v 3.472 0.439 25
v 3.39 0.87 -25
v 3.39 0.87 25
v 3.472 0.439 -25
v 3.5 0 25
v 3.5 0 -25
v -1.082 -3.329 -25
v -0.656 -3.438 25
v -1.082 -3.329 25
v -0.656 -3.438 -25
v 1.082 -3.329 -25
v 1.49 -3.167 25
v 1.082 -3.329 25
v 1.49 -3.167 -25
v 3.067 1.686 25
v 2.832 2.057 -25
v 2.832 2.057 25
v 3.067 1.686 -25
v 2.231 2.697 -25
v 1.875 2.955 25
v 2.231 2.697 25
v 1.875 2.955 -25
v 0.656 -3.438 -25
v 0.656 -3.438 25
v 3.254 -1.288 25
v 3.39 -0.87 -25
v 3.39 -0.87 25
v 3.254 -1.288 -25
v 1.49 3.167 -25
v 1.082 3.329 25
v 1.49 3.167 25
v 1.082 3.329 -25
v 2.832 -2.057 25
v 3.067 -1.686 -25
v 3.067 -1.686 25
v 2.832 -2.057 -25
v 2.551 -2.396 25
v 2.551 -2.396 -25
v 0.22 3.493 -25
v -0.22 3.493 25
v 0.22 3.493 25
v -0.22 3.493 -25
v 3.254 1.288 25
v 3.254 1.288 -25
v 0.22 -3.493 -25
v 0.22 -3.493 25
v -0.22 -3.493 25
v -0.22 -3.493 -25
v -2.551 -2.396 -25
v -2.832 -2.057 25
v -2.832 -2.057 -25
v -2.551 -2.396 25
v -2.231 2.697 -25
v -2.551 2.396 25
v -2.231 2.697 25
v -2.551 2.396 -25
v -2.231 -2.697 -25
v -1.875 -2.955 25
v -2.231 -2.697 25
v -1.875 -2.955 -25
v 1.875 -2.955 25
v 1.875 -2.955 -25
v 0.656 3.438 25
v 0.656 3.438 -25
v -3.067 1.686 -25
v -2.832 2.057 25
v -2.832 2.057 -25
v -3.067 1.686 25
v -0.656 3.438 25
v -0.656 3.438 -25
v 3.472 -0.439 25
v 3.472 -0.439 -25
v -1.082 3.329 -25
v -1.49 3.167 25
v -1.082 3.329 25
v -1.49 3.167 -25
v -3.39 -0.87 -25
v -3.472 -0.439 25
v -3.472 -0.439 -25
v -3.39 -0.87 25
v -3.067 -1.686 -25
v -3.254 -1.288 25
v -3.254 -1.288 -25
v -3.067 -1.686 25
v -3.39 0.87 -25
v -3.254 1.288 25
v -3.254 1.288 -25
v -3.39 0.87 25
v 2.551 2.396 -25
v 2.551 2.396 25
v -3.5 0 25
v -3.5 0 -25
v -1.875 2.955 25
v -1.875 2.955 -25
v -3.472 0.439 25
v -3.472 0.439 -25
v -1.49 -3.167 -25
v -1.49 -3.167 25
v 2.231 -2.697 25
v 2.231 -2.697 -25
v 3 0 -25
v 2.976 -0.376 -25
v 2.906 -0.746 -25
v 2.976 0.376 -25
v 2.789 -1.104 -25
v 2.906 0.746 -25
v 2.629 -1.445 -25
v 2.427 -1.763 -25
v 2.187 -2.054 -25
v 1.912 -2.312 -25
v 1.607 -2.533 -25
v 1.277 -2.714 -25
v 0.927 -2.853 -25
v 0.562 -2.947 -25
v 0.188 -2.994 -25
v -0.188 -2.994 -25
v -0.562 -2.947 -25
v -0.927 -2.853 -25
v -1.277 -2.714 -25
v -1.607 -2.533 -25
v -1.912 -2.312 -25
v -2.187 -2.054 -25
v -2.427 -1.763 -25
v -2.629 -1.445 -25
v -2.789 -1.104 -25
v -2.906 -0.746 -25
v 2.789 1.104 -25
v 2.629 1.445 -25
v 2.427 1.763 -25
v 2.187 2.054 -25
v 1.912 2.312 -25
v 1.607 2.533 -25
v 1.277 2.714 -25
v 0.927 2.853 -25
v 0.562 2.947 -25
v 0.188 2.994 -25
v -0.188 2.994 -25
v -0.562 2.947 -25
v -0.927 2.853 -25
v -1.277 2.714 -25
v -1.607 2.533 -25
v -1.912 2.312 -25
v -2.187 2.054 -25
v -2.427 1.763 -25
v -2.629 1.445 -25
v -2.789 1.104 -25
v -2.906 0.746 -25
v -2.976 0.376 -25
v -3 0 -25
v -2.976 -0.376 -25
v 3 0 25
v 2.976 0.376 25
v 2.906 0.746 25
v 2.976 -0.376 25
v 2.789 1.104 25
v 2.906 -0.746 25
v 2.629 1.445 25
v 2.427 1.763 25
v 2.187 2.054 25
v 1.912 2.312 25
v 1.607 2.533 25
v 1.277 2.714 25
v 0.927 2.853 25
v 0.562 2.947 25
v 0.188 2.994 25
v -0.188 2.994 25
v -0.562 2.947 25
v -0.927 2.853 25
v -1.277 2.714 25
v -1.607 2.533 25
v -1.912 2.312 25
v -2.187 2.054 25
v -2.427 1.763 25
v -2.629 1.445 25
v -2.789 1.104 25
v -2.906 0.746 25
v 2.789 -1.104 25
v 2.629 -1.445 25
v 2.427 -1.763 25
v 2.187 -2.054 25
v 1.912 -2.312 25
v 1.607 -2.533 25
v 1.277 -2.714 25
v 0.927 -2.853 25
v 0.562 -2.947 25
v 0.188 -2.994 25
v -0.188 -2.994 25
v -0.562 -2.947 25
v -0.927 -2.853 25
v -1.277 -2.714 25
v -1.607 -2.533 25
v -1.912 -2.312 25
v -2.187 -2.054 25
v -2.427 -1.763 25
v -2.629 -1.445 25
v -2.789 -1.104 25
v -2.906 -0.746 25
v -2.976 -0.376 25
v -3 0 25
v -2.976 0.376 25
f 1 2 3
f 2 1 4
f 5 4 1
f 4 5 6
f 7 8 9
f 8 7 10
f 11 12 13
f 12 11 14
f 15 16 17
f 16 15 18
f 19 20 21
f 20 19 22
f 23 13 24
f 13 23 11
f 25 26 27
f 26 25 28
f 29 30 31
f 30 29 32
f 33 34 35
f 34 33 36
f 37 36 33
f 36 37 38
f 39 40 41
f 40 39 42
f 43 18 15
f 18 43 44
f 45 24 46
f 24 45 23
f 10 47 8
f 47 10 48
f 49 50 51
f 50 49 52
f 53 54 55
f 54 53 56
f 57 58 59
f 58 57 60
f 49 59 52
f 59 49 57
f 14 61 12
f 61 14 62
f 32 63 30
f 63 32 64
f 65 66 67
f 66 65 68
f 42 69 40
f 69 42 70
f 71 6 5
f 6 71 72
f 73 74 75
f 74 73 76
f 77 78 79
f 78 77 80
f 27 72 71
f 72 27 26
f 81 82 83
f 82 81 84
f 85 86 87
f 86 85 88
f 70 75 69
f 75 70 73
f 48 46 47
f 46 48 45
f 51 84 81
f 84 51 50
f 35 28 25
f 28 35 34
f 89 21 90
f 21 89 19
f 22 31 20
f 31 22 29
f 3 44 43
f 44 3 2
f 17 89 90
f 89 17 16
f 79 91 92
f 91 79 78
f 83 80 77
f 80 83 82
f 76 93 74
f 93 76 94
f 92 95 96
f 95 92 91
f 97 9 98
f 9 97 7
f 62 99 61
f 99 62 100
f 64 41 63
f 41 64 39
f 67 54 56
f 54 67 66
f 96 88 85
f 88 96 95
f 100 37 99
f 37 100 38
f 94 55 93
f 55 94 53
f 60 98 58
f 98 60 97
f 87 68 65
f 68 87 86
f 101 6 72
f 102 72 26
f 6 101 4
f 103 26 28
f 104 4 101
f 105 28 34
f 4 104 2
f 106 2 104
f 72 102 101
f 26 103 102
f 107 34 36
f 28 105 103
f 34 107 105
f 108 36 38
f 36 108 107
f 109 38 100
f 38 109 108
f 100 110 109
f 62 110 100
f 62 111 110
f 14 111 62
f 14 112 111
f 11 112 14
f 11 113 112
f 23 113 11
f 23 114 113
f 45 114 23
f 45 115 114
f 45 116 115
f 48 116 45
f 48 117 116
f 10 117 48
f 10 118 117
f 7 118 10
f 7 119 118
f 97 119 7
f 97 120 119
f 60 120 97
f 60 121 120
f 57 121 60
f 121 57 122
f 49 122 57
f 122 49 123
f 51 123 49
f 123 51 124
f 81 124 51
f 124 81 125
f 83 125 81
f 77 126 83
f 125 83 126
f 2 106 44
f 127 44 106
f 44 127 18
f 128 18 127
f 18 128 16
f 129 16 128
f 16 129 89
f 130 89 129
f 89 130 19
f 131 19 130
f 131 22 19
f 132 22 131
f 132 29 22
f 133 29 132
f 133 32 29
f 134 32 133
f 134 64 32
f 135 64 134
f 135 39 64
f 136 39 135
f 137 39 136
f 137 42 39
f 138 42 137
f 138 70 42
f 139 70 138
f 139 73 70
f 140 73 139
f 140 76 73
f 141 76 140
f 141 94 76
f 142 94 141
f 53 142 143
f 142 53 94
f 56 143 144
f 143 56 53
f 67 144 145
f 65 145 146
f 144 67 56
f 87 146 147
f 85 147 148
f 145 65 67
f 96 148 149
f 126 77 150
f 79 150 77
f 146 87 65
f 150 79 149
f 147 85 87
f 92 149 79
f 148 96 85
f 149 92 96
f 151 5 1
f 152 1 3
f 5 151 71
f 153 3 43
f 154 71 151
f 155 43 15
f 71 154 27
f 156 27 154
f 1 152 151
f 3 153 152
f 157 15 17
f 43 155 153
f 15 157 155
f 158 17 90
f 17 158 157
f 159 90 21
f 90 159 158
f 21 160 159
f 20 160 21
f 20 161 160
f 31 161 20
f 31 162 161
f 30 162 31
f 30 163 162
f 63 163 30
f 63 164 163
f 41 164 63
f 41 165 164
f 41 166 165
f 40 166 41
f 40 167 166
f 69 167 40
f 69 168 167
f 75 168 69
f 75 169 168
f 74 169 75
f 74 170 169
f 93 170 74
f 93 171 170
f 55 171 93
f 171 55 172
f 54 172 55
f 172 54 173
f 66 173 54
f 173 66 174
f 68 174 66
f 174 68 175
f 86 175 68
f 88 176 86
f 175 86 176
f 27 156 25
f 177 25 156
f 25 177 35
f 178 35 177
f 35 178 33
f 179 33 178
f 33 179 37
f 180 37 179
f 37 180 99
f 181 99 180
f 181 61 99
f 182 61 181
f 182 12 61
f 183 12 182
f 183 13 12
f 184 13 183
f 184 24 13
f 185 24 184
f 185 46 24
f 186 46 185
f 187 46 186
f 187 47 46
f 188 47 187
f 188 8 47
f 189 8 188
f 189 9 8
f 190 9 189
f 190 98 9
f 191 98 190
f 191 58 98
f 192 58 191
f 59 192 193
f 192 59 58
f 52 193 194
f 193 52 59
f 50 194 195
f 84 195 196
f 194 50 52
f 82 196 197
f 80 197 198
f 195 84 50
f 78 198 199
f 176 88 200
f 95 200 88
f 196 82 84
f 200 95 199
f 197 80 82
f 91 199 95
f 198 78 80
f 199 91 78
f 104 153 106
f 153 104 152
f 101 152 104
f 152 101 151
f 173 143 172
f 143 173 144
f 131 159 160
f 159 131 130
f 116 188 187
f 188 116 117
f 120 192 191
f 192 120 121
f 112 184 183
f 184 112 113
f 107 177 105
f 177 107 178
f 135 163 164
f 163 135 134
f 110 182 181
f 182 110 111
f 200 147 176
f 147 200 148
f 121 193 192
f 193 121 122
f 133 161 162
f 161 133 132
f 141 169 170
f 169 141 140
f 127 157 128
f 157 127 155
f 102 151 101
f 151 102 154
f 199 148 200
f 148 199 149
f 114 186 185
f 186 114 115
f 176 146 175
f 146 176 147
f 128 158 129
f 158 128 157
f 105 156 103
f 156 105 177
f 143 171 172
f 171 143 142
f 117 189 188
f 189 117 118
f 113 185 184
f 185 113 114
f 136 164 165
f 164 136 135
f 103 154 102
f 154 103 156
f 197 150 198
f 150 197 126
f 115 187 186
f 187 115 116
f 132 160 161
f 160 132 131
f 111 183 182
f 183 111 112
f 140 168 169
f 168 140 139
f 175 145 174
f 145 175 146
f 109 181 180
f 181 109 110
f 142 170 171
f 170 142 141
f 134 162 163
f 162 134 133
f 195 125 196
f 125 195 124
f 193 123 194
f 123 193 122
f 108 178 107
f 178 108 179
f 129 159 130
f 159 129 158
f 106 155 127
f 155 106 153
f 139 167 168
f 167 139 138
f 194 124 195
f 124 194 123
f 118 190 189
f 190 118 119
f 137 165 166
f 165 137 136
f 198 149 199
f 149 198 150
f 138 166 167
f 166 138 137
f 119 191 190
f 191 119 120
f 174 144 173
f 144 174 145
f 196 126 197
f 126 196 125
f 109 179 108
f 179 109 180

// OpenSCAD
$fn = 50;


difference() {
	union() {
		translate(v = [0, 0, -25.0000000000]) {
			cylinder(h = 50, r = 3.5000000000);
		}
	}
	union() {
		translate(v = [0, 0, -100.0000000000]) {
			cylinder(h = 200, r = 3.0000000000);
		}
	}
}
